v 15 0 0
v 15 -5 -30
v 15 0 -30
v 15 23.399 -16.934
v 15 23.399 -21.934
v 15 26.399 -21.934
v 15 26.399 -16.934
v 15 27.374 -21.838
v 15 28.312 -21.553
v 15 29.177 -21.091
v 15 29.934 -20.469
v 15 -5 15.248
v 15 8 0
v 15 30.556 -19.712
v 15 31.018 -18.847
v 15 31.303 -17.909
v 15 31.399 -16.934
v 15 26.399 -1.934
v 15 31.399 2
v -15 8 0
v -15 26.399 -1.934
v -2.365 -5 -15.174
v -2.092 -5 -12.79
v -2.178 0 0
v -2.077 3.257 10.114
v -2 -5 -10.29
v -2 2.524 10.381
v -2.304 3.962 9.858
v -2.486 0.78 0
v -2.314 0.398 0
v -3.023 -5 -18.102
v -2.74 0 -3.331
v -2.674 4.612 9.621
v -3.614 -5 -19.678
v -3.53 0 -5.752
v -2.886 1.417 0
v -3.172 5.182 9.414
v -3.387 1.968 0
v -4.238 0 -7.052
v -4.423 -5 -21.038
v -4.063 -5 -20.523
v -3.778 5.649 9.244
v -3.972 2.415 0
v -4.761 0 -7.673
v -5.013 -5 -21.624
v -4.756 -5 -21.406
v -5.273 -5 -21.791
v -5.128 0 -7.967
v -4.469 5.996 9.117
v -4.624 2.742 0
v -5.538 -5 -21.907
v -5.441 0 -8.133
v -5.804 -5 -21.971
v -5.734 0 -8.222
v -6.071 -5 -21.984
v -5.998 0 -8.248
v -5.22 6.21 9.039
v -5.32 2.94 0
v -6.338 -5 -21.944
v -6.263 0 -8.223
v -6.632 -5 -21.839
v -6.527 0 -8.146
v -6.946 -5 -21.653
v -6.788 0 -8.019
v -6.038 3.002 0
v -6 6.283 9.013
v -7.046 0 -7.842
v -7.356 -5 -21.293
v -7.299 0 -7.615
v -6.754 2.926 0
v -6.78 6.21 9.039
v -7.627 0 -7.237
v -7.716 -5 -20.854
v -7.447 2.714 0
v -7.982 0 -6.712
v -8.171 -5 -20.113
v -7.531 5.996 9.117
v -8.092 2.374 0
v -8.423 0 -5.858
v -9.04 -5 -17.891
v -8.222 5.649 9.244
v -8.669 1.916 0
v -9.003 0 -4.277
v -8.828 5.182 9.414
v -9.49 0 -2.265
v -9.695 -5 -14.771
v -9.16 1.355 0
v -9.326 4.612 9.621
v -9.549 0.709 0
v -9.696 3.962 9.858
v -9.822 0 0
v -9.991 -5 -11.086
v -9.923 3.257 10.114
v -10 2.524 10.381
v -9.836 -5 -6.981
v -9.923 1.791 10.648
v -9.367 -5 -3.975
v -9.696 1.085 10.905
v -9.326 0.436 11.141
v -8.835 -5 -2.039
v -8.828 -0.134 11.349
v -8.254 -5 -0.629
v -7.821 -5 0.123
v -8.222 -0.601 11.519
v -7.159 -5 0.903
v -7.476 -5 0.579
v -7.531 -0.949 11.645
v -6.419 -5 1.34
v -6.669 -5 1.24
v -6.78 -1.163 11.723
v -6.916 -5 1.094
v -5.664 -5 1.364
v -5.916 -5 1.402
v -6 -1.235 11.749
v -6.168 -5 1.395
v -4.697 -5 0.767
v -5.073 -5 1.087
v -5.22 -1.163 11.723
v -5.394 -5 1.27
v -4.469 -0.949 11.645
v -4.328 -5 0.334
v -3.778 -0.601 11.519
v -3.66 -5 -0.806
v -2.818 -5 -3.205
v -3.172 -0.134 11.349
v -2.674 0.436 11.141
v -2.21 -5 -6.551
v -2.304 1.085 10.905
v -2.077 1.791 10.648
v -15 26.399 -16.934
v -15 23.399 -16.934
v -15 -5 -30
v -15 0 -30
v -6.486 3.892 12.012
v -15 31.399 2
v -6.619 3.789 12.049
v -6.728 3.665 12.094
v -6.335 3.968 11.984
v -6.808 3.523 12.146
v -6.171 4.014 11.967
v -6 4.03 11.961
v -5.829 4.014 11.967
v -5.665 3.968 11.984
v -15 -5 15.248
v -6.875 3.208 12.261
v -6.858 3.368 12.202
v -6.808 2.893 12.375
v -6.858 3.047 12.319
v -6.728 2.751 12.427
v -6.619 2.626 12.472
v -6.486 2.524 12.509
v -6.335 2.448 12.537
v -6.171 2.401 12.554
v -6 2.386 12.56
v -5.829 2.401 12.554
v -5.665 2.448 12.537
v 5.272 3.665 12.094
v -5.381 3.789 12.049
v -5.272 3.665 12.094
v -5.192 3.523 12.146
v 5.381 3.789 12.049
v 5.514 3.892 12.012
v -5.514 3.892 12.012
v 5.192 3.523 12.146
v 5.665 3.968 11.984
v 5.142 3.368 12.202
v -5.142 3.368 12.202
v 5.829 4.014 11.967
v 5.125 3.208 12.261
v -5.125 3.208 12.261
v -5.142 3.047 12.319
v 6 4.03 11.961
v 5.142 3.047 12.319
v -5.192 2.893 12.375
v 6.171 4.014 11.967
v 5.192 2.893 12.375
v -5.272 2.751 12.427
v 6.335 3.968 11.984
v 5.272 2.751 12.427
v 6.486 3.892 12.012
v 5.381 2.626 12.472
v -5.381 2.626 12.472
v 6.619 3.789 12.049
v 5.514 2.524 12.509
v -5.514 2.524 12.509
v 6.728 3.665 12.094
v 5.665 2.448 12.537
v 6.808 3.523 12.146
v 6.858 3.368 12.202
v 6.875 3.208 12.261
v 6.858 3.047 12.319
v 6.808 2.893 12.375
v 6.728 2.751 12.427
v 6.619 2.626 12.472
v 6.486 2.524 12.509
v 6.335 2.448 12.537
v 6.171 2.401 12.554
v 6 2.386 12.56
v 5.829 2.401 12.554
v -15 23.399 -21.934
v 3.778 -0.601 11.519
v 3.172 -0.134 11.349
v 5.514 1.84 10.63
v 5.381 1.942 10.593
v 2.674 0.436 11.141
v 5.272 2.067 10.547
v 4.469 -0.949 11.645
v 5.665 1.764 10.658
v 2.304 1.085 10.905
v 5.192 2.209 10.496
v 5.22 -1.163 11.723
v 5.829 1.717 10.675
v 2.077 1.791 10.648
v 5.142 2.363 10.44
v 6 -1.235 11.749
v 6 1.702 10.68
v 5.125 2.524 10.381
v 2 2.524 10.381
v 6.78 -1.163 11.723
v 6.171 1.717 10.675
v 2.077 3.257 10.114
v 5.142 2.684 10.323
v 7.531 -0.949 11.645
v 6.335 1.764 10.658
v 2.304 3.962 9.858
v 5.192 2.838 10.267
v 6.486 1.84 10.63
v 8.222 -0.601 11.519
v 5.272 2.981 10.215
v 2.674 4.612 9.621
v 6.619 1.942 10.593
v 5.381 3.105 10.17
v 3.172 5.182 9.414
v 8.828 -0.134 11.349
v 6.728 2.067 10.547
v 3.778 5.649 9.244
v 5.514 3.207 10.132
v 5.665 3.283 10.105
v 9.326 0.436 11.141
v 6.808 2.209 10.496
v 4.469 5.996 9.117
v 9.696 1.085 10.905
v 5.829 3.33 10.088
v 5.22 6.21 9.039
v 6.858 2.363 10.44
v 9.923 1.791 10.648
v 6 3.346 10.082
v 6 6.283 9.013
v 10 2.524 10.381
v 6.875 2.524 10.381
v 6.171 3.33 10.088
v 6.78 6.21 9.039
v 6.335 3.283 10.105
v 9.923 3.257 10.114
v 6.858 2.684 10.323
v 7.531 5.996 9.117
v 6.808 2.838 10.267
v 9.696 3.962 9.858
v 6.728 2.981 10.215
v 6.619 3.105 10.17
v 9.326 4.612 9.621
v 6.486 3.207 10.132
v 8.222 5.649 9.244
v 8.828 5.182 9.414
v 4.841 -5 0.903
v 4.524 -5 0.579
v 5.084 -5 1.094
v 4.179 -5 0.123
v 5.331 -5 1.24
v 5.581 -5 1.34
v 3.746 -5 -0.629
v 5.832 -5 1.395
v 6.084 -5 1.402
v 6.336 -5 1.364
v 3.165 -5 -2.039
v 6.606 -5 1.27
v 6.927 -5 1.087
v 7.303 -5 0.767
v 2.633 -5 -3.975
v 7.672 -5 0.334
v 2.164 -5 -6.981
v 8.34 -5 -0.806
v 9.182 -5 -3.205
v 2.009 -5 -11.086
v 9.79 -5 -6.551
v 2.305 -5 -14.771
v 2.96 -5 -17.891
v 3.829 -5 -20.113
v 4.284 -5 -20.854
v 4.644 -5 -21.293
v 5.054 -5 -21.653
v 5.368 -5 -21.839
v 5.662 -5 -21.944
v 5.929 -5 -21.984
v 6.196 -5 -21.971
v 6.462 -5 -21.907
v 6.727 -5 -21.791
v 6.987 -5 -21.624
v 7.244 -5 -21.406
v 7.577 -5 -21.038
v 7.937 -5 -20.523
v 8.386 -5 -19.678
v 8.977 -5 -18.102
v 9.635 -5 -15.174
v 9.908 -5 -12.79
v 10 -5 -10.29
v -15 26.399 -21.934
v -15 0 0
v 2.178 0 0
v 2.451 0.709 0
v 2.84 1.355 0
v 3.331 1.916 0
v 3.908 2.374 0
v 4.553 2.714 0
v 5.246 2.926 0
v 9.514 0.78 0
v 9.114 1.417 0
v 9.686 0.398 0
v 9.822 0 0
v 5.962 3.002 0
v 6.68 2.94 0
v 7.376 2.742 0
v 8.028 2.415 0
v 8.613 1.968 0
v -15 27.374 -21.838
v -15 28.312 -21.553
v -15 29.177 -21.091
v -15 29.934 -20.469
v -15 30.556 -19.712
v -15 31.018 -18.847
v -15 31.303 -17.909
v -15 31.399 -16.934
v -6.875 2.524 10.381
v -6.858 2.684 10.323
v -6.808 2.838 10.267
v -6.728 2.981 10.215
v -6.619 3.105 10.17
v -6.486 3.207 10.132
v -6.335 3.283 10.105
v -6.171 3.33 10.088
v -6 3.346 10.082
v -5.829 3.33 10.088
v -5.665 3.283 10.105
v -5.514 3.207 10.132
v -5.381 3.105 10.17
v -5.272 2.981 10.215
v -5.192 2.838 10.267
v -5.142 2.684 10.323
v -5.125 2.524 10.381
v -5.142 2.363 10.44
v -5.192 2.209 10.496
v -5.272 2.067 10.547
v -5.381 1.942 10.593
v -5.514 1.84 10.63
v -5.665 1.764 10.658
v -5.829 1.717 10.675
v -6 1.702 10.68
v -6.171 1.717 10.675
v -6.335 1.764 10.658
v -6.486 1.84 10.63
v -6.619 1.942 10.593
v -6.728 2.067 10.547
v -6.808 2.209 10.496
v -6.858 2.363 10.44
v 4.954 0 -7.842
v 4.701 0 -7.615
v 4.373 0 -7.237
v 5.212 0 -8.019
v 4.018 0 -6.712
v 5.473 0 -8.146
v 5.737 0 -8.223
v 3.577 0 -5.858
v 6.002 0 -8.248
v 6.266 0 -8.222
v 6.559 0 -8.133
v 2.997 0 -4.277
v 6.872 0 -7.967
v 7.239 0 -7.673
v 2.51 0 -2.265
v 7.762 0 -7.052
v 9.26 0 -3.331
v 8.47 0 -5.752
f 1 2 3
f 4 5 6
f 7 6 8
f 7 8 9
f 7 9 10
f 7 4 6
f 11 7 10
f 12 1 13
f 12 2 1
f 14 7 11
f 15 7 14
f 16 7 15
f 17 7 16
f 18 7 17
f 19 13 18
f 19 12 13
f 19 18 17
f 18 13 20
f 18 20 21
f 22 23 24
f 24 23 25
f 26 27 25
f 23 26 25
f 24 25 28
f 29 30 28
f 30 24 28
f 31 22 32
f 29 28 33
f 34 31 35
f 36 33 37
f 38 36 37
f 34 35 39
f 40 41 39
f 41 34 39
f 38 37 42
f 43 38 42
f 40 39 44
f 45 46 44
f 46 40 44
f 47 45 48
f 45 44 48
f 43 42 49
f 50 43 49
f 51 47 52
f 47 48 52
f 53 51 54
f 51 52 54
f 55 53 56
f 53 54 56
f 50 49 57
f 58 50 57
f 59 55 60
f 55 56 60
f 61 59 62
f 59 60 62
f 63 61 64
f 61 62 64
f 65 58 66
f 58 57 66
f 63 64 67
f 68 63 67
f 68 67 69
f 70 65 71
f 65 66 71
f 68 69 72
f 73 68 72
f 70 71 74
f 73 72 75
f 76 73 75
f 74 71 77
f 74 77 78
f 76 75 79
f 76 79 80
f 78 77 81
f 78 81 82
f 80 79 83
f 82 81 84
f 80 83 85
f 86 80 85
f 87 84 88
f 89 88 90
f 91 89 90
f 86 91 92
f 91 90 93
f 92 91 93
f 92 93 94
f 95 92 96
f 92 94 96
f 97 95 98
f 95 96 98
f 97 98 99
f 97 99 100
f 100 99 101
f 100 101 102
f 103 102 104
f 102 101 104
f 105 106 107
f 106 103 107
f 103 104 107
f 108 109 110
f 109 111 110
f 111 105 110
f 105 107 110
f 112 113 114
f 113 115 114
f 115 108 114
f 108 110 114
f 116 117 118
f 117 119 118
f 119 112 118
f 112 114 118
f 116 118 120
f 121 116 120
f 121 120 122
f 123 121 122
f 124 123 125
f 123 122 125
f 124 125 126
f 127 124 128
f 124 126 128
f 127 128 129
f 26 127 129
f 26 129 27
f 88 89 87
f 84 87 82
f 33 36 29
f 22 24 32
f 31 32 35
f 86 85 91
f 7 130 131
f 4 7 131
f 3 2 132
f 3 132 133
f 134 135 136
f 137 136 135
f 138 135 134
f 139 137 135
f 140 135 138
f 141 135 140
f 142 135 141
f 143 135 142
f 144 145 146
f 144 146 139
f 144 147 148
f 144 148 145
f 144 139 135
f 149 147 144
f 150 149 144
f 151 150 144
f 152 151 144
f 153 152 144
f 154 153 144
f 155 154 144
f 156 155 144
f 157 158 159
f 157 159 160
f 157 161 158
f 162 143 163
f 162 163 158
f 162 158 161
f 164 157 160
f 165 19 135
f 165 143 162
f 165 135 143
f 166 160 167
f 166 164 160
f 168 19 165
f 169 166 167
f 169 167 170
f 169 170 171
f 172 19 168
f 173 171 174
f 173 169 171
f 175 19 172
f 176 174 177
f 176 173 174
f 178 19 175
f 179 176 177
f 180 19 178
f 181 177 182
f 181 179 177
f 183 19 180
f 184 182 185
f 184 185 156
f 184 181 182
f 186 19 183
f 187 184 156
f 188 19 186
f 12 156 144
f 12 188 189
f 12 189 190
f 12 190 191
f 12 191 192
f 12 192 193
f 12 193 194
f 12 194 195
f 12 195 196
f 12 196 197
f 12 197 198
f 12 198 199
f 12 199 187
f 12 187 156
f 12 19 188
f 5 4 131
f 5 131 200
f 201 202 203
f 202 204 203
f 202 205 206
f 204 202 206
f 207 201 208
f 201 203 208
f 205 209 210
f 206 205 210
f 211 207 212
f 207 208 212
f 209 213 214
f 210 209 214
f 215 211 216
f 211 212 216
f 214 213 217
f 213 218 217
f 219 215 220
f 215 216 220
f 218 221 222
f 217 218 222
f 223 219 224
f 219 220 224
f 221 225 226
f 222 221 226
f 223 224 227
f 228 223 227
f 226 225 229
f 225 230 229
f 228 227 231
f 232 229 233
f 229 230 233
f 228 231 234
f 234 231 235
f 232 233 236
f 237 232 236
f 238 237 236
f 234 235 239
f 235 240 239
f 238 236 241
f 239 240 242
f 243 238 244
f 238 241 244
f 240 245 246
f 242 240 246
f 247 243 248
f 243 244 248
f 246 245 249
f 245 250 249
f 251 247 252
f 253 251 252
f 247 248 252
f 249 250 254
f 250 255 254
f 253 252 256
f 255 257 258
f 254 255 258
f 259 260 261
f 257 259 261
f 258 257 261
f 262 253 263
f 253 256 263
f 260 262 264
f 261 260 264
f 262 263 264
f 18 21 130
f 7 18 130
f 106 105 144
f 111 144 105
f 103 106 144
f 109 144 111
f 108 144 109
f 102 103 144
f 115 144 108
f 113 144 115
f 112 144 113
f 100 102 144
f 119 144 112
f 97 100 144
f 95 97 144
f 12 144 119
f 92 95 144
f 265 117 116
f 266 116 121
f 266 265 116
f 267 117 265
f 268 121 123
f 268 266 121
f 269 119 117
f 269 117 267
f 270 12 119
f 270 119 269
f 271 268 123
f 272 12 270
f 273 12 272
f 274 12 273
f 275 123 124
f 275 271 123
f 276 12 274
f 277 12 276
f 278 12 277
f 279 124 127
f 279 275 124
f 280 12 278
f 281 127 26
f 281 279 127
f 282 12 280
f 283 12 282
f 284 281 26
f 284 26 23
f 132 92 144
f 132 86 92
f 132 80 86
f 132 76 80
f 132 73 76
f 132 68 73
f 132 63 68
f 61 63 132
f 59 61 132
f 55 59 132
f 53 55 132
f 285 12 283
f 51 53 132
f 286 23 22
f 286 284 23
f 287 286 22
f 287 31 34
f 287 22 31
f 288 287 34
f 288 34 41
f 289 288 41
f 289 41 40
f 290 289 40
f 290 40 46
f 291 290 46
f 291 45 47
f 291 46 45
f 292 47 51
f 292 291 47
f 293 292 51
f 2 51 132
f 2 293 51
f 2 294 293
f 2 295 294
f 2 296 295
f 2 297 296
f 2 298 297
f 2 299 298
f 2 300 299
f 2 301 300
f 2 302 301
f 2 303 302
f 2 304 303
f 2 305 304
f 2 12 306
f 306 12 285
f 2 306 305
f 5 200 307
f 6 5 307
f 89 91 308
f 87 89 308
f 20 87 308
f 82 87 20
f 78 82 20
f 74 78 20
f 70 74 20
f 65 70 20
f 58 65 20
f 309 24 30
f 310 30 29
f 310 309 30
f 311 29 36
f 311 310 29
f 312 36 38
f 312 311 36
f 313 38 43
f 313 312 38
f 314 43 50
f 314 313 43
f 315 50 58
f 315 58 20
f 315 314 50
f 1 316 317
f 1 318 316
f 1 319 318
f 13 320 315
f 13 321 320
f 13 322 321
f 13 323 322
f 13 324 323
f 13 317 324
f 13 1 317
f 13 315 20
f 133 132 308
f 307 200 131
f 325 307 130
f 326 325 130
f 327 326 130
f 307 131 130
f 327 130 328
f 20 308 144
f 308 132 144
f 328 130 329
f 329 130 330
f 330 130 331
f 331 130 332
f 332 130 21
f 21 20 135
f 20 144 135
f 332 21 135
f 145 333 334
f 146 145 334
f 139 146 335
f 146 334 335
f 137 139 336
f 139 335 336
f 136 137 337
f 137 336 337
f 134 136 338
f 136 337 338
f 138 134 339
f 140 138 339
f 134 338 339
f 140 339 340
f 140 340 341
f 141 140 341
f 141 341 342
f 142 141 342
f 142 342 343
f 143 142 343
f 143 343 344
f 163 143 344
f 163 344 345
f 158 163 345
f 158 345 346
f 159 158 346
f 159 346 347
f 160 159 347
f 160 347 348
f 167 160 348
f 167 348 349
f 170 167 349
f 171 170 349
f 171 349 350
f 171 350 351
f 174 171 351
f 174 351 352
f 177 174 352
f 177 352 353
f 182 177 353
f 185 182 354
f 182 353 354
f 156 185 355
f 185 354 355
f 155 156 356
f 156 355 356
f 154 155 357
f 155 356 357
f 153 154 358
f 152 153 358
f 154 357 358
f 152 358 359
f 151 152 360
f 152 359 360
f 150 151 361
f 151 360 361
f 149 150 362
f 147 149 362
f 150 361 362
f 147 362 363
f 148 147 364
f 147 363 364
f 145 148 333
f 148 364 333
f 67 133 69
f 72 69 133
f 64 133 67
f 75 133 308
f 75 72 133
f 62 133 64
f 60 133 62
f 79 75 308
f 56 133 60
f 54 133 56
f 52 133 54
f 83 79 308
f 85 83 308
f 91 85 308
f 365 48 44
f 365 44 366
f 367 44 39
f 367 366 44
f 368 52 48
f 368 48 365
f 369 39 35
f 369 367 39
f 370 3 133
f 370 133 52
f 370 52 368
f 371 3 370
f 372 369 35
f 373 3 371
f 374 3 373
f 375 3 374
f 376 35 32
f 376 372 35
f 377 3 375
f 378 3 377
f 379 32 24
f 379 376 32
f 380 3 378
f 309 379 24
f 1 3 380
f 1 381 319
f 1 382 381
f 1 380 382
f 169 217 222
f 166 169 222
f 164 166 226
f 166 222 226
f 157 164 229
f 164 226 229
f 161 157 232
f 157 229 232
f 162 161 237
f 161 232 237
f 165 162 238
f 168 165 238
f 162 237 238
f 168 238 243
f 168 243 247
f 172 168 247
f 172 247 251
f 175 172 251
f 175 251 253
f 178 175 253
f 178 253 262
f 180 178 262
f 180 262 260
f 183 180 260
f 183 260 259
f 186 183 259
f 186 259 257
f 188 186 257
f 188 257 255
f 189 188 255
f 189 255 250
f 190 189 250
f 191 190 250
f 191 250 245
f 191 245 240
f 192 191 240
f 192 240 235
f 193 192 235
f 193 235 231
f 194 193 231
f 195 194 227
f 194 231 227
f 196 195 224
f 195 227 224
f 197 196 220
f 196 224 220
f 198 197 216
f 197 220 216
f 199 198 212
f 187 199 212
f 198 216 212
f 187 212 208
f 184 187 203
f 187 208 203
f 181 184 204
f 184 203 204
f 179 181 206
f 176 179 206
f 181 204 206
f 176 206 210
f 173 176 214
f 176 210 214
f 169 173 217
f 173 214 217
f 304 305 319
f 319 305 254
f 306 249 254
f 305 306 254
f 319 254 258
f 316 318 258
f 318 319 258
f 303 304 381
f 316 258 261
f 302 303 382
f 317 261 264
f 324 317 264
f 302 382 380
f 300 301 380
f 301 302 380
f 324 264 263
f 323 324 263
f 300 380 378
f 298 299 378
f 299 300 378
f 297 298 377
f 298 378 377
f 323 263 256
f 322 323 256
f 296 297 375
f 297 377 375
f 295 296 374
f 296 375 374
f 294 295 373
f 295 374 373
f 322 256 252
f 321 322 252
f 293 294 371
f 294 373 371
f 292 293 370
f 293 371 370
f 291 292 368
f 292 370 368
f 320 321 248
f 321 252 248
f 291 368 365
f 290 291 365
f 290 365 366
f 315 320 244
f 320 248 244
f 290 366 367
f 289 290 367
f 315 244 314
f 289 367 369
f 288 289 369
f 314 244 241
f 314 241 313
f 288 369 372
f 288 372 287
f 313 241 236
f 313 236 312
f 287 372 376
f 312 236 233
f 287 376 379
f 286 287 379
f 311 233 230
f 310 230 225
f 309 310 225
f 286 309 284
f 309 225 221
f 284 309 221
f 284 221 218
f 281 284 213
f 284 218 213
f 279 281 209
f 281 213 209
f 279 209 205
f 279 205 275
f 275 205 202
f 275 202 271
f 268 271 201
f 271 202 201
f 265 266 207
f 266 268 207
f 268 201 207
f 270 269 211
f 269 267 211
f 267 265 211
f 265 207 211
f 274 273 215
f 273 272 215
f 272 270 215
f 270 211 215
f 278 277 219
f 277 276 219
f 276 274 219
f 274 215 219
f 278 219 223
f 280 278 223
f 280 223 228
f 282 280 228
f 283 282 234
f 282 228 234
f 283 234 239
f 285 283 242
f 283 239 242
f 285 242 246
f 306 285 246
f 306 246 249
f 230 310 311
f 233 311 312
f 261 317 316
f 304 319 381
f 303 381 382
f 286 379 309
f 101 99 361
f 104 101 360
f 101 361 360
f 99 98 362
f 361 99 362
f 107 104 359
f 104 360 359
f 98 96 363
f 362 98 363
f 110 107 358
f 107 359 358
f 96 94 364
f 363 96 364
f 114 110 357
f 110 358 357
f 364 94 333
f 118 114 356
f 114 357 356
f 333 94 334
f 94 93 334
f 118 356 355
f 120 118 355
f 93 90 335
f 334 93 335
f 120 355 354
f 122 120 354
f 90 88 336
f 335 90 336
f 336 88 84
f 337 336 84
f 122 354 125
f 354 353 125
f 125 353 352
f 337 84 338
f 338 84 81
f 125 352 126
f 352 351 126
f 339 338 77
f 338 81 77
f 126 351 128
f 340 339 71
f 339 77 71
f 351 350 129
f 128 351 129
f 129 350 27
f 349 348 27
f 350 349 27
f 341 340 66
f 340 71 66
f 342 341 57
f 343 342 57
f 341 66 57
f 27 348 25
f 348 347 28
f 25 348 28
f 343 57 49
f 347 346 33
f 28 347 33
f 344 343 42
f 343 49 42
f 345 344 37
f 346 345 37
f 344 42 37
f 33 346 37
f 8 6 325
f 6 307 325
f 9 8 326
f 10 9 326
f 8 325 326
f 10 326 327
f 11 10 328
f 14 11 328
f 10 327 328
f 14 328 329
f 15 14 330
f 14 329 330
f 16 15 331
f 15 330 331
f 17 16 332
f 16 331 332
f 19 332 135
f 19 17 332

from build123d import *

# Parameters (mm, degrees)
F1_DEPTH = 15
F3_START = -2
F2_R     = 4
F3_DEPTH = 40.5202370871
F4_D     = 1.75
F5_R     = 5


with BuildPart() as f1:
    # F0 (on Right) → F1 (new body, symmetric)
    with BuildSketch(Plane.YZ):
        Polygon((-5, 15.2480270107), (-5, -30), (0, -30), (0, 0), (8, 0), (26.3986550643, -1.9337765705), (26.3986550643, -16.9337765705), (23.3986550643, -16.9337765705), (23.3986550643, -21.9337765705), (31.3986550643, -21.9337765705), (31.3986550643, 2), align=None)
    extrude(amount=F1_DEPTH, both=True)

    # F2 (on face) → F3 (cut)
    with BuildSketch(Plane(origin=(0, 4.3157325251, 11.8573776612), x_dir=(1, 0, 0), z_dir=(0, 0.3420201433, 0.9396926208)).offset(F3_START)):
        with Locations((-6, -1.1789558201)):
            Circle(F2_R)
        with Locations((6, -1.1789558201)):
            Circle(F2_R)
    extrude(amount=-F3_DEPTH, mode=Mode.SUBTRACT)

    # F4 (through all)
    with Locations(Plane(origin=(0, 4.3157325251, 11.8573776612), x_dir=(1, 0, 0), z_dir=(0, 0.3420201433, 0.9396926208))):
        with Locations((6, -1.1789558201), (-6, -1.1789558201)):
            Hole(F4_D / 2)

    # F5
    f5_edges = [f1.edges().sort_by_distance(p)[0] for p in [
        (0, 31.398655, -21.933777),
    ]]
    fillet(f5_edges, radius=F5_R)


solid = f1.part
